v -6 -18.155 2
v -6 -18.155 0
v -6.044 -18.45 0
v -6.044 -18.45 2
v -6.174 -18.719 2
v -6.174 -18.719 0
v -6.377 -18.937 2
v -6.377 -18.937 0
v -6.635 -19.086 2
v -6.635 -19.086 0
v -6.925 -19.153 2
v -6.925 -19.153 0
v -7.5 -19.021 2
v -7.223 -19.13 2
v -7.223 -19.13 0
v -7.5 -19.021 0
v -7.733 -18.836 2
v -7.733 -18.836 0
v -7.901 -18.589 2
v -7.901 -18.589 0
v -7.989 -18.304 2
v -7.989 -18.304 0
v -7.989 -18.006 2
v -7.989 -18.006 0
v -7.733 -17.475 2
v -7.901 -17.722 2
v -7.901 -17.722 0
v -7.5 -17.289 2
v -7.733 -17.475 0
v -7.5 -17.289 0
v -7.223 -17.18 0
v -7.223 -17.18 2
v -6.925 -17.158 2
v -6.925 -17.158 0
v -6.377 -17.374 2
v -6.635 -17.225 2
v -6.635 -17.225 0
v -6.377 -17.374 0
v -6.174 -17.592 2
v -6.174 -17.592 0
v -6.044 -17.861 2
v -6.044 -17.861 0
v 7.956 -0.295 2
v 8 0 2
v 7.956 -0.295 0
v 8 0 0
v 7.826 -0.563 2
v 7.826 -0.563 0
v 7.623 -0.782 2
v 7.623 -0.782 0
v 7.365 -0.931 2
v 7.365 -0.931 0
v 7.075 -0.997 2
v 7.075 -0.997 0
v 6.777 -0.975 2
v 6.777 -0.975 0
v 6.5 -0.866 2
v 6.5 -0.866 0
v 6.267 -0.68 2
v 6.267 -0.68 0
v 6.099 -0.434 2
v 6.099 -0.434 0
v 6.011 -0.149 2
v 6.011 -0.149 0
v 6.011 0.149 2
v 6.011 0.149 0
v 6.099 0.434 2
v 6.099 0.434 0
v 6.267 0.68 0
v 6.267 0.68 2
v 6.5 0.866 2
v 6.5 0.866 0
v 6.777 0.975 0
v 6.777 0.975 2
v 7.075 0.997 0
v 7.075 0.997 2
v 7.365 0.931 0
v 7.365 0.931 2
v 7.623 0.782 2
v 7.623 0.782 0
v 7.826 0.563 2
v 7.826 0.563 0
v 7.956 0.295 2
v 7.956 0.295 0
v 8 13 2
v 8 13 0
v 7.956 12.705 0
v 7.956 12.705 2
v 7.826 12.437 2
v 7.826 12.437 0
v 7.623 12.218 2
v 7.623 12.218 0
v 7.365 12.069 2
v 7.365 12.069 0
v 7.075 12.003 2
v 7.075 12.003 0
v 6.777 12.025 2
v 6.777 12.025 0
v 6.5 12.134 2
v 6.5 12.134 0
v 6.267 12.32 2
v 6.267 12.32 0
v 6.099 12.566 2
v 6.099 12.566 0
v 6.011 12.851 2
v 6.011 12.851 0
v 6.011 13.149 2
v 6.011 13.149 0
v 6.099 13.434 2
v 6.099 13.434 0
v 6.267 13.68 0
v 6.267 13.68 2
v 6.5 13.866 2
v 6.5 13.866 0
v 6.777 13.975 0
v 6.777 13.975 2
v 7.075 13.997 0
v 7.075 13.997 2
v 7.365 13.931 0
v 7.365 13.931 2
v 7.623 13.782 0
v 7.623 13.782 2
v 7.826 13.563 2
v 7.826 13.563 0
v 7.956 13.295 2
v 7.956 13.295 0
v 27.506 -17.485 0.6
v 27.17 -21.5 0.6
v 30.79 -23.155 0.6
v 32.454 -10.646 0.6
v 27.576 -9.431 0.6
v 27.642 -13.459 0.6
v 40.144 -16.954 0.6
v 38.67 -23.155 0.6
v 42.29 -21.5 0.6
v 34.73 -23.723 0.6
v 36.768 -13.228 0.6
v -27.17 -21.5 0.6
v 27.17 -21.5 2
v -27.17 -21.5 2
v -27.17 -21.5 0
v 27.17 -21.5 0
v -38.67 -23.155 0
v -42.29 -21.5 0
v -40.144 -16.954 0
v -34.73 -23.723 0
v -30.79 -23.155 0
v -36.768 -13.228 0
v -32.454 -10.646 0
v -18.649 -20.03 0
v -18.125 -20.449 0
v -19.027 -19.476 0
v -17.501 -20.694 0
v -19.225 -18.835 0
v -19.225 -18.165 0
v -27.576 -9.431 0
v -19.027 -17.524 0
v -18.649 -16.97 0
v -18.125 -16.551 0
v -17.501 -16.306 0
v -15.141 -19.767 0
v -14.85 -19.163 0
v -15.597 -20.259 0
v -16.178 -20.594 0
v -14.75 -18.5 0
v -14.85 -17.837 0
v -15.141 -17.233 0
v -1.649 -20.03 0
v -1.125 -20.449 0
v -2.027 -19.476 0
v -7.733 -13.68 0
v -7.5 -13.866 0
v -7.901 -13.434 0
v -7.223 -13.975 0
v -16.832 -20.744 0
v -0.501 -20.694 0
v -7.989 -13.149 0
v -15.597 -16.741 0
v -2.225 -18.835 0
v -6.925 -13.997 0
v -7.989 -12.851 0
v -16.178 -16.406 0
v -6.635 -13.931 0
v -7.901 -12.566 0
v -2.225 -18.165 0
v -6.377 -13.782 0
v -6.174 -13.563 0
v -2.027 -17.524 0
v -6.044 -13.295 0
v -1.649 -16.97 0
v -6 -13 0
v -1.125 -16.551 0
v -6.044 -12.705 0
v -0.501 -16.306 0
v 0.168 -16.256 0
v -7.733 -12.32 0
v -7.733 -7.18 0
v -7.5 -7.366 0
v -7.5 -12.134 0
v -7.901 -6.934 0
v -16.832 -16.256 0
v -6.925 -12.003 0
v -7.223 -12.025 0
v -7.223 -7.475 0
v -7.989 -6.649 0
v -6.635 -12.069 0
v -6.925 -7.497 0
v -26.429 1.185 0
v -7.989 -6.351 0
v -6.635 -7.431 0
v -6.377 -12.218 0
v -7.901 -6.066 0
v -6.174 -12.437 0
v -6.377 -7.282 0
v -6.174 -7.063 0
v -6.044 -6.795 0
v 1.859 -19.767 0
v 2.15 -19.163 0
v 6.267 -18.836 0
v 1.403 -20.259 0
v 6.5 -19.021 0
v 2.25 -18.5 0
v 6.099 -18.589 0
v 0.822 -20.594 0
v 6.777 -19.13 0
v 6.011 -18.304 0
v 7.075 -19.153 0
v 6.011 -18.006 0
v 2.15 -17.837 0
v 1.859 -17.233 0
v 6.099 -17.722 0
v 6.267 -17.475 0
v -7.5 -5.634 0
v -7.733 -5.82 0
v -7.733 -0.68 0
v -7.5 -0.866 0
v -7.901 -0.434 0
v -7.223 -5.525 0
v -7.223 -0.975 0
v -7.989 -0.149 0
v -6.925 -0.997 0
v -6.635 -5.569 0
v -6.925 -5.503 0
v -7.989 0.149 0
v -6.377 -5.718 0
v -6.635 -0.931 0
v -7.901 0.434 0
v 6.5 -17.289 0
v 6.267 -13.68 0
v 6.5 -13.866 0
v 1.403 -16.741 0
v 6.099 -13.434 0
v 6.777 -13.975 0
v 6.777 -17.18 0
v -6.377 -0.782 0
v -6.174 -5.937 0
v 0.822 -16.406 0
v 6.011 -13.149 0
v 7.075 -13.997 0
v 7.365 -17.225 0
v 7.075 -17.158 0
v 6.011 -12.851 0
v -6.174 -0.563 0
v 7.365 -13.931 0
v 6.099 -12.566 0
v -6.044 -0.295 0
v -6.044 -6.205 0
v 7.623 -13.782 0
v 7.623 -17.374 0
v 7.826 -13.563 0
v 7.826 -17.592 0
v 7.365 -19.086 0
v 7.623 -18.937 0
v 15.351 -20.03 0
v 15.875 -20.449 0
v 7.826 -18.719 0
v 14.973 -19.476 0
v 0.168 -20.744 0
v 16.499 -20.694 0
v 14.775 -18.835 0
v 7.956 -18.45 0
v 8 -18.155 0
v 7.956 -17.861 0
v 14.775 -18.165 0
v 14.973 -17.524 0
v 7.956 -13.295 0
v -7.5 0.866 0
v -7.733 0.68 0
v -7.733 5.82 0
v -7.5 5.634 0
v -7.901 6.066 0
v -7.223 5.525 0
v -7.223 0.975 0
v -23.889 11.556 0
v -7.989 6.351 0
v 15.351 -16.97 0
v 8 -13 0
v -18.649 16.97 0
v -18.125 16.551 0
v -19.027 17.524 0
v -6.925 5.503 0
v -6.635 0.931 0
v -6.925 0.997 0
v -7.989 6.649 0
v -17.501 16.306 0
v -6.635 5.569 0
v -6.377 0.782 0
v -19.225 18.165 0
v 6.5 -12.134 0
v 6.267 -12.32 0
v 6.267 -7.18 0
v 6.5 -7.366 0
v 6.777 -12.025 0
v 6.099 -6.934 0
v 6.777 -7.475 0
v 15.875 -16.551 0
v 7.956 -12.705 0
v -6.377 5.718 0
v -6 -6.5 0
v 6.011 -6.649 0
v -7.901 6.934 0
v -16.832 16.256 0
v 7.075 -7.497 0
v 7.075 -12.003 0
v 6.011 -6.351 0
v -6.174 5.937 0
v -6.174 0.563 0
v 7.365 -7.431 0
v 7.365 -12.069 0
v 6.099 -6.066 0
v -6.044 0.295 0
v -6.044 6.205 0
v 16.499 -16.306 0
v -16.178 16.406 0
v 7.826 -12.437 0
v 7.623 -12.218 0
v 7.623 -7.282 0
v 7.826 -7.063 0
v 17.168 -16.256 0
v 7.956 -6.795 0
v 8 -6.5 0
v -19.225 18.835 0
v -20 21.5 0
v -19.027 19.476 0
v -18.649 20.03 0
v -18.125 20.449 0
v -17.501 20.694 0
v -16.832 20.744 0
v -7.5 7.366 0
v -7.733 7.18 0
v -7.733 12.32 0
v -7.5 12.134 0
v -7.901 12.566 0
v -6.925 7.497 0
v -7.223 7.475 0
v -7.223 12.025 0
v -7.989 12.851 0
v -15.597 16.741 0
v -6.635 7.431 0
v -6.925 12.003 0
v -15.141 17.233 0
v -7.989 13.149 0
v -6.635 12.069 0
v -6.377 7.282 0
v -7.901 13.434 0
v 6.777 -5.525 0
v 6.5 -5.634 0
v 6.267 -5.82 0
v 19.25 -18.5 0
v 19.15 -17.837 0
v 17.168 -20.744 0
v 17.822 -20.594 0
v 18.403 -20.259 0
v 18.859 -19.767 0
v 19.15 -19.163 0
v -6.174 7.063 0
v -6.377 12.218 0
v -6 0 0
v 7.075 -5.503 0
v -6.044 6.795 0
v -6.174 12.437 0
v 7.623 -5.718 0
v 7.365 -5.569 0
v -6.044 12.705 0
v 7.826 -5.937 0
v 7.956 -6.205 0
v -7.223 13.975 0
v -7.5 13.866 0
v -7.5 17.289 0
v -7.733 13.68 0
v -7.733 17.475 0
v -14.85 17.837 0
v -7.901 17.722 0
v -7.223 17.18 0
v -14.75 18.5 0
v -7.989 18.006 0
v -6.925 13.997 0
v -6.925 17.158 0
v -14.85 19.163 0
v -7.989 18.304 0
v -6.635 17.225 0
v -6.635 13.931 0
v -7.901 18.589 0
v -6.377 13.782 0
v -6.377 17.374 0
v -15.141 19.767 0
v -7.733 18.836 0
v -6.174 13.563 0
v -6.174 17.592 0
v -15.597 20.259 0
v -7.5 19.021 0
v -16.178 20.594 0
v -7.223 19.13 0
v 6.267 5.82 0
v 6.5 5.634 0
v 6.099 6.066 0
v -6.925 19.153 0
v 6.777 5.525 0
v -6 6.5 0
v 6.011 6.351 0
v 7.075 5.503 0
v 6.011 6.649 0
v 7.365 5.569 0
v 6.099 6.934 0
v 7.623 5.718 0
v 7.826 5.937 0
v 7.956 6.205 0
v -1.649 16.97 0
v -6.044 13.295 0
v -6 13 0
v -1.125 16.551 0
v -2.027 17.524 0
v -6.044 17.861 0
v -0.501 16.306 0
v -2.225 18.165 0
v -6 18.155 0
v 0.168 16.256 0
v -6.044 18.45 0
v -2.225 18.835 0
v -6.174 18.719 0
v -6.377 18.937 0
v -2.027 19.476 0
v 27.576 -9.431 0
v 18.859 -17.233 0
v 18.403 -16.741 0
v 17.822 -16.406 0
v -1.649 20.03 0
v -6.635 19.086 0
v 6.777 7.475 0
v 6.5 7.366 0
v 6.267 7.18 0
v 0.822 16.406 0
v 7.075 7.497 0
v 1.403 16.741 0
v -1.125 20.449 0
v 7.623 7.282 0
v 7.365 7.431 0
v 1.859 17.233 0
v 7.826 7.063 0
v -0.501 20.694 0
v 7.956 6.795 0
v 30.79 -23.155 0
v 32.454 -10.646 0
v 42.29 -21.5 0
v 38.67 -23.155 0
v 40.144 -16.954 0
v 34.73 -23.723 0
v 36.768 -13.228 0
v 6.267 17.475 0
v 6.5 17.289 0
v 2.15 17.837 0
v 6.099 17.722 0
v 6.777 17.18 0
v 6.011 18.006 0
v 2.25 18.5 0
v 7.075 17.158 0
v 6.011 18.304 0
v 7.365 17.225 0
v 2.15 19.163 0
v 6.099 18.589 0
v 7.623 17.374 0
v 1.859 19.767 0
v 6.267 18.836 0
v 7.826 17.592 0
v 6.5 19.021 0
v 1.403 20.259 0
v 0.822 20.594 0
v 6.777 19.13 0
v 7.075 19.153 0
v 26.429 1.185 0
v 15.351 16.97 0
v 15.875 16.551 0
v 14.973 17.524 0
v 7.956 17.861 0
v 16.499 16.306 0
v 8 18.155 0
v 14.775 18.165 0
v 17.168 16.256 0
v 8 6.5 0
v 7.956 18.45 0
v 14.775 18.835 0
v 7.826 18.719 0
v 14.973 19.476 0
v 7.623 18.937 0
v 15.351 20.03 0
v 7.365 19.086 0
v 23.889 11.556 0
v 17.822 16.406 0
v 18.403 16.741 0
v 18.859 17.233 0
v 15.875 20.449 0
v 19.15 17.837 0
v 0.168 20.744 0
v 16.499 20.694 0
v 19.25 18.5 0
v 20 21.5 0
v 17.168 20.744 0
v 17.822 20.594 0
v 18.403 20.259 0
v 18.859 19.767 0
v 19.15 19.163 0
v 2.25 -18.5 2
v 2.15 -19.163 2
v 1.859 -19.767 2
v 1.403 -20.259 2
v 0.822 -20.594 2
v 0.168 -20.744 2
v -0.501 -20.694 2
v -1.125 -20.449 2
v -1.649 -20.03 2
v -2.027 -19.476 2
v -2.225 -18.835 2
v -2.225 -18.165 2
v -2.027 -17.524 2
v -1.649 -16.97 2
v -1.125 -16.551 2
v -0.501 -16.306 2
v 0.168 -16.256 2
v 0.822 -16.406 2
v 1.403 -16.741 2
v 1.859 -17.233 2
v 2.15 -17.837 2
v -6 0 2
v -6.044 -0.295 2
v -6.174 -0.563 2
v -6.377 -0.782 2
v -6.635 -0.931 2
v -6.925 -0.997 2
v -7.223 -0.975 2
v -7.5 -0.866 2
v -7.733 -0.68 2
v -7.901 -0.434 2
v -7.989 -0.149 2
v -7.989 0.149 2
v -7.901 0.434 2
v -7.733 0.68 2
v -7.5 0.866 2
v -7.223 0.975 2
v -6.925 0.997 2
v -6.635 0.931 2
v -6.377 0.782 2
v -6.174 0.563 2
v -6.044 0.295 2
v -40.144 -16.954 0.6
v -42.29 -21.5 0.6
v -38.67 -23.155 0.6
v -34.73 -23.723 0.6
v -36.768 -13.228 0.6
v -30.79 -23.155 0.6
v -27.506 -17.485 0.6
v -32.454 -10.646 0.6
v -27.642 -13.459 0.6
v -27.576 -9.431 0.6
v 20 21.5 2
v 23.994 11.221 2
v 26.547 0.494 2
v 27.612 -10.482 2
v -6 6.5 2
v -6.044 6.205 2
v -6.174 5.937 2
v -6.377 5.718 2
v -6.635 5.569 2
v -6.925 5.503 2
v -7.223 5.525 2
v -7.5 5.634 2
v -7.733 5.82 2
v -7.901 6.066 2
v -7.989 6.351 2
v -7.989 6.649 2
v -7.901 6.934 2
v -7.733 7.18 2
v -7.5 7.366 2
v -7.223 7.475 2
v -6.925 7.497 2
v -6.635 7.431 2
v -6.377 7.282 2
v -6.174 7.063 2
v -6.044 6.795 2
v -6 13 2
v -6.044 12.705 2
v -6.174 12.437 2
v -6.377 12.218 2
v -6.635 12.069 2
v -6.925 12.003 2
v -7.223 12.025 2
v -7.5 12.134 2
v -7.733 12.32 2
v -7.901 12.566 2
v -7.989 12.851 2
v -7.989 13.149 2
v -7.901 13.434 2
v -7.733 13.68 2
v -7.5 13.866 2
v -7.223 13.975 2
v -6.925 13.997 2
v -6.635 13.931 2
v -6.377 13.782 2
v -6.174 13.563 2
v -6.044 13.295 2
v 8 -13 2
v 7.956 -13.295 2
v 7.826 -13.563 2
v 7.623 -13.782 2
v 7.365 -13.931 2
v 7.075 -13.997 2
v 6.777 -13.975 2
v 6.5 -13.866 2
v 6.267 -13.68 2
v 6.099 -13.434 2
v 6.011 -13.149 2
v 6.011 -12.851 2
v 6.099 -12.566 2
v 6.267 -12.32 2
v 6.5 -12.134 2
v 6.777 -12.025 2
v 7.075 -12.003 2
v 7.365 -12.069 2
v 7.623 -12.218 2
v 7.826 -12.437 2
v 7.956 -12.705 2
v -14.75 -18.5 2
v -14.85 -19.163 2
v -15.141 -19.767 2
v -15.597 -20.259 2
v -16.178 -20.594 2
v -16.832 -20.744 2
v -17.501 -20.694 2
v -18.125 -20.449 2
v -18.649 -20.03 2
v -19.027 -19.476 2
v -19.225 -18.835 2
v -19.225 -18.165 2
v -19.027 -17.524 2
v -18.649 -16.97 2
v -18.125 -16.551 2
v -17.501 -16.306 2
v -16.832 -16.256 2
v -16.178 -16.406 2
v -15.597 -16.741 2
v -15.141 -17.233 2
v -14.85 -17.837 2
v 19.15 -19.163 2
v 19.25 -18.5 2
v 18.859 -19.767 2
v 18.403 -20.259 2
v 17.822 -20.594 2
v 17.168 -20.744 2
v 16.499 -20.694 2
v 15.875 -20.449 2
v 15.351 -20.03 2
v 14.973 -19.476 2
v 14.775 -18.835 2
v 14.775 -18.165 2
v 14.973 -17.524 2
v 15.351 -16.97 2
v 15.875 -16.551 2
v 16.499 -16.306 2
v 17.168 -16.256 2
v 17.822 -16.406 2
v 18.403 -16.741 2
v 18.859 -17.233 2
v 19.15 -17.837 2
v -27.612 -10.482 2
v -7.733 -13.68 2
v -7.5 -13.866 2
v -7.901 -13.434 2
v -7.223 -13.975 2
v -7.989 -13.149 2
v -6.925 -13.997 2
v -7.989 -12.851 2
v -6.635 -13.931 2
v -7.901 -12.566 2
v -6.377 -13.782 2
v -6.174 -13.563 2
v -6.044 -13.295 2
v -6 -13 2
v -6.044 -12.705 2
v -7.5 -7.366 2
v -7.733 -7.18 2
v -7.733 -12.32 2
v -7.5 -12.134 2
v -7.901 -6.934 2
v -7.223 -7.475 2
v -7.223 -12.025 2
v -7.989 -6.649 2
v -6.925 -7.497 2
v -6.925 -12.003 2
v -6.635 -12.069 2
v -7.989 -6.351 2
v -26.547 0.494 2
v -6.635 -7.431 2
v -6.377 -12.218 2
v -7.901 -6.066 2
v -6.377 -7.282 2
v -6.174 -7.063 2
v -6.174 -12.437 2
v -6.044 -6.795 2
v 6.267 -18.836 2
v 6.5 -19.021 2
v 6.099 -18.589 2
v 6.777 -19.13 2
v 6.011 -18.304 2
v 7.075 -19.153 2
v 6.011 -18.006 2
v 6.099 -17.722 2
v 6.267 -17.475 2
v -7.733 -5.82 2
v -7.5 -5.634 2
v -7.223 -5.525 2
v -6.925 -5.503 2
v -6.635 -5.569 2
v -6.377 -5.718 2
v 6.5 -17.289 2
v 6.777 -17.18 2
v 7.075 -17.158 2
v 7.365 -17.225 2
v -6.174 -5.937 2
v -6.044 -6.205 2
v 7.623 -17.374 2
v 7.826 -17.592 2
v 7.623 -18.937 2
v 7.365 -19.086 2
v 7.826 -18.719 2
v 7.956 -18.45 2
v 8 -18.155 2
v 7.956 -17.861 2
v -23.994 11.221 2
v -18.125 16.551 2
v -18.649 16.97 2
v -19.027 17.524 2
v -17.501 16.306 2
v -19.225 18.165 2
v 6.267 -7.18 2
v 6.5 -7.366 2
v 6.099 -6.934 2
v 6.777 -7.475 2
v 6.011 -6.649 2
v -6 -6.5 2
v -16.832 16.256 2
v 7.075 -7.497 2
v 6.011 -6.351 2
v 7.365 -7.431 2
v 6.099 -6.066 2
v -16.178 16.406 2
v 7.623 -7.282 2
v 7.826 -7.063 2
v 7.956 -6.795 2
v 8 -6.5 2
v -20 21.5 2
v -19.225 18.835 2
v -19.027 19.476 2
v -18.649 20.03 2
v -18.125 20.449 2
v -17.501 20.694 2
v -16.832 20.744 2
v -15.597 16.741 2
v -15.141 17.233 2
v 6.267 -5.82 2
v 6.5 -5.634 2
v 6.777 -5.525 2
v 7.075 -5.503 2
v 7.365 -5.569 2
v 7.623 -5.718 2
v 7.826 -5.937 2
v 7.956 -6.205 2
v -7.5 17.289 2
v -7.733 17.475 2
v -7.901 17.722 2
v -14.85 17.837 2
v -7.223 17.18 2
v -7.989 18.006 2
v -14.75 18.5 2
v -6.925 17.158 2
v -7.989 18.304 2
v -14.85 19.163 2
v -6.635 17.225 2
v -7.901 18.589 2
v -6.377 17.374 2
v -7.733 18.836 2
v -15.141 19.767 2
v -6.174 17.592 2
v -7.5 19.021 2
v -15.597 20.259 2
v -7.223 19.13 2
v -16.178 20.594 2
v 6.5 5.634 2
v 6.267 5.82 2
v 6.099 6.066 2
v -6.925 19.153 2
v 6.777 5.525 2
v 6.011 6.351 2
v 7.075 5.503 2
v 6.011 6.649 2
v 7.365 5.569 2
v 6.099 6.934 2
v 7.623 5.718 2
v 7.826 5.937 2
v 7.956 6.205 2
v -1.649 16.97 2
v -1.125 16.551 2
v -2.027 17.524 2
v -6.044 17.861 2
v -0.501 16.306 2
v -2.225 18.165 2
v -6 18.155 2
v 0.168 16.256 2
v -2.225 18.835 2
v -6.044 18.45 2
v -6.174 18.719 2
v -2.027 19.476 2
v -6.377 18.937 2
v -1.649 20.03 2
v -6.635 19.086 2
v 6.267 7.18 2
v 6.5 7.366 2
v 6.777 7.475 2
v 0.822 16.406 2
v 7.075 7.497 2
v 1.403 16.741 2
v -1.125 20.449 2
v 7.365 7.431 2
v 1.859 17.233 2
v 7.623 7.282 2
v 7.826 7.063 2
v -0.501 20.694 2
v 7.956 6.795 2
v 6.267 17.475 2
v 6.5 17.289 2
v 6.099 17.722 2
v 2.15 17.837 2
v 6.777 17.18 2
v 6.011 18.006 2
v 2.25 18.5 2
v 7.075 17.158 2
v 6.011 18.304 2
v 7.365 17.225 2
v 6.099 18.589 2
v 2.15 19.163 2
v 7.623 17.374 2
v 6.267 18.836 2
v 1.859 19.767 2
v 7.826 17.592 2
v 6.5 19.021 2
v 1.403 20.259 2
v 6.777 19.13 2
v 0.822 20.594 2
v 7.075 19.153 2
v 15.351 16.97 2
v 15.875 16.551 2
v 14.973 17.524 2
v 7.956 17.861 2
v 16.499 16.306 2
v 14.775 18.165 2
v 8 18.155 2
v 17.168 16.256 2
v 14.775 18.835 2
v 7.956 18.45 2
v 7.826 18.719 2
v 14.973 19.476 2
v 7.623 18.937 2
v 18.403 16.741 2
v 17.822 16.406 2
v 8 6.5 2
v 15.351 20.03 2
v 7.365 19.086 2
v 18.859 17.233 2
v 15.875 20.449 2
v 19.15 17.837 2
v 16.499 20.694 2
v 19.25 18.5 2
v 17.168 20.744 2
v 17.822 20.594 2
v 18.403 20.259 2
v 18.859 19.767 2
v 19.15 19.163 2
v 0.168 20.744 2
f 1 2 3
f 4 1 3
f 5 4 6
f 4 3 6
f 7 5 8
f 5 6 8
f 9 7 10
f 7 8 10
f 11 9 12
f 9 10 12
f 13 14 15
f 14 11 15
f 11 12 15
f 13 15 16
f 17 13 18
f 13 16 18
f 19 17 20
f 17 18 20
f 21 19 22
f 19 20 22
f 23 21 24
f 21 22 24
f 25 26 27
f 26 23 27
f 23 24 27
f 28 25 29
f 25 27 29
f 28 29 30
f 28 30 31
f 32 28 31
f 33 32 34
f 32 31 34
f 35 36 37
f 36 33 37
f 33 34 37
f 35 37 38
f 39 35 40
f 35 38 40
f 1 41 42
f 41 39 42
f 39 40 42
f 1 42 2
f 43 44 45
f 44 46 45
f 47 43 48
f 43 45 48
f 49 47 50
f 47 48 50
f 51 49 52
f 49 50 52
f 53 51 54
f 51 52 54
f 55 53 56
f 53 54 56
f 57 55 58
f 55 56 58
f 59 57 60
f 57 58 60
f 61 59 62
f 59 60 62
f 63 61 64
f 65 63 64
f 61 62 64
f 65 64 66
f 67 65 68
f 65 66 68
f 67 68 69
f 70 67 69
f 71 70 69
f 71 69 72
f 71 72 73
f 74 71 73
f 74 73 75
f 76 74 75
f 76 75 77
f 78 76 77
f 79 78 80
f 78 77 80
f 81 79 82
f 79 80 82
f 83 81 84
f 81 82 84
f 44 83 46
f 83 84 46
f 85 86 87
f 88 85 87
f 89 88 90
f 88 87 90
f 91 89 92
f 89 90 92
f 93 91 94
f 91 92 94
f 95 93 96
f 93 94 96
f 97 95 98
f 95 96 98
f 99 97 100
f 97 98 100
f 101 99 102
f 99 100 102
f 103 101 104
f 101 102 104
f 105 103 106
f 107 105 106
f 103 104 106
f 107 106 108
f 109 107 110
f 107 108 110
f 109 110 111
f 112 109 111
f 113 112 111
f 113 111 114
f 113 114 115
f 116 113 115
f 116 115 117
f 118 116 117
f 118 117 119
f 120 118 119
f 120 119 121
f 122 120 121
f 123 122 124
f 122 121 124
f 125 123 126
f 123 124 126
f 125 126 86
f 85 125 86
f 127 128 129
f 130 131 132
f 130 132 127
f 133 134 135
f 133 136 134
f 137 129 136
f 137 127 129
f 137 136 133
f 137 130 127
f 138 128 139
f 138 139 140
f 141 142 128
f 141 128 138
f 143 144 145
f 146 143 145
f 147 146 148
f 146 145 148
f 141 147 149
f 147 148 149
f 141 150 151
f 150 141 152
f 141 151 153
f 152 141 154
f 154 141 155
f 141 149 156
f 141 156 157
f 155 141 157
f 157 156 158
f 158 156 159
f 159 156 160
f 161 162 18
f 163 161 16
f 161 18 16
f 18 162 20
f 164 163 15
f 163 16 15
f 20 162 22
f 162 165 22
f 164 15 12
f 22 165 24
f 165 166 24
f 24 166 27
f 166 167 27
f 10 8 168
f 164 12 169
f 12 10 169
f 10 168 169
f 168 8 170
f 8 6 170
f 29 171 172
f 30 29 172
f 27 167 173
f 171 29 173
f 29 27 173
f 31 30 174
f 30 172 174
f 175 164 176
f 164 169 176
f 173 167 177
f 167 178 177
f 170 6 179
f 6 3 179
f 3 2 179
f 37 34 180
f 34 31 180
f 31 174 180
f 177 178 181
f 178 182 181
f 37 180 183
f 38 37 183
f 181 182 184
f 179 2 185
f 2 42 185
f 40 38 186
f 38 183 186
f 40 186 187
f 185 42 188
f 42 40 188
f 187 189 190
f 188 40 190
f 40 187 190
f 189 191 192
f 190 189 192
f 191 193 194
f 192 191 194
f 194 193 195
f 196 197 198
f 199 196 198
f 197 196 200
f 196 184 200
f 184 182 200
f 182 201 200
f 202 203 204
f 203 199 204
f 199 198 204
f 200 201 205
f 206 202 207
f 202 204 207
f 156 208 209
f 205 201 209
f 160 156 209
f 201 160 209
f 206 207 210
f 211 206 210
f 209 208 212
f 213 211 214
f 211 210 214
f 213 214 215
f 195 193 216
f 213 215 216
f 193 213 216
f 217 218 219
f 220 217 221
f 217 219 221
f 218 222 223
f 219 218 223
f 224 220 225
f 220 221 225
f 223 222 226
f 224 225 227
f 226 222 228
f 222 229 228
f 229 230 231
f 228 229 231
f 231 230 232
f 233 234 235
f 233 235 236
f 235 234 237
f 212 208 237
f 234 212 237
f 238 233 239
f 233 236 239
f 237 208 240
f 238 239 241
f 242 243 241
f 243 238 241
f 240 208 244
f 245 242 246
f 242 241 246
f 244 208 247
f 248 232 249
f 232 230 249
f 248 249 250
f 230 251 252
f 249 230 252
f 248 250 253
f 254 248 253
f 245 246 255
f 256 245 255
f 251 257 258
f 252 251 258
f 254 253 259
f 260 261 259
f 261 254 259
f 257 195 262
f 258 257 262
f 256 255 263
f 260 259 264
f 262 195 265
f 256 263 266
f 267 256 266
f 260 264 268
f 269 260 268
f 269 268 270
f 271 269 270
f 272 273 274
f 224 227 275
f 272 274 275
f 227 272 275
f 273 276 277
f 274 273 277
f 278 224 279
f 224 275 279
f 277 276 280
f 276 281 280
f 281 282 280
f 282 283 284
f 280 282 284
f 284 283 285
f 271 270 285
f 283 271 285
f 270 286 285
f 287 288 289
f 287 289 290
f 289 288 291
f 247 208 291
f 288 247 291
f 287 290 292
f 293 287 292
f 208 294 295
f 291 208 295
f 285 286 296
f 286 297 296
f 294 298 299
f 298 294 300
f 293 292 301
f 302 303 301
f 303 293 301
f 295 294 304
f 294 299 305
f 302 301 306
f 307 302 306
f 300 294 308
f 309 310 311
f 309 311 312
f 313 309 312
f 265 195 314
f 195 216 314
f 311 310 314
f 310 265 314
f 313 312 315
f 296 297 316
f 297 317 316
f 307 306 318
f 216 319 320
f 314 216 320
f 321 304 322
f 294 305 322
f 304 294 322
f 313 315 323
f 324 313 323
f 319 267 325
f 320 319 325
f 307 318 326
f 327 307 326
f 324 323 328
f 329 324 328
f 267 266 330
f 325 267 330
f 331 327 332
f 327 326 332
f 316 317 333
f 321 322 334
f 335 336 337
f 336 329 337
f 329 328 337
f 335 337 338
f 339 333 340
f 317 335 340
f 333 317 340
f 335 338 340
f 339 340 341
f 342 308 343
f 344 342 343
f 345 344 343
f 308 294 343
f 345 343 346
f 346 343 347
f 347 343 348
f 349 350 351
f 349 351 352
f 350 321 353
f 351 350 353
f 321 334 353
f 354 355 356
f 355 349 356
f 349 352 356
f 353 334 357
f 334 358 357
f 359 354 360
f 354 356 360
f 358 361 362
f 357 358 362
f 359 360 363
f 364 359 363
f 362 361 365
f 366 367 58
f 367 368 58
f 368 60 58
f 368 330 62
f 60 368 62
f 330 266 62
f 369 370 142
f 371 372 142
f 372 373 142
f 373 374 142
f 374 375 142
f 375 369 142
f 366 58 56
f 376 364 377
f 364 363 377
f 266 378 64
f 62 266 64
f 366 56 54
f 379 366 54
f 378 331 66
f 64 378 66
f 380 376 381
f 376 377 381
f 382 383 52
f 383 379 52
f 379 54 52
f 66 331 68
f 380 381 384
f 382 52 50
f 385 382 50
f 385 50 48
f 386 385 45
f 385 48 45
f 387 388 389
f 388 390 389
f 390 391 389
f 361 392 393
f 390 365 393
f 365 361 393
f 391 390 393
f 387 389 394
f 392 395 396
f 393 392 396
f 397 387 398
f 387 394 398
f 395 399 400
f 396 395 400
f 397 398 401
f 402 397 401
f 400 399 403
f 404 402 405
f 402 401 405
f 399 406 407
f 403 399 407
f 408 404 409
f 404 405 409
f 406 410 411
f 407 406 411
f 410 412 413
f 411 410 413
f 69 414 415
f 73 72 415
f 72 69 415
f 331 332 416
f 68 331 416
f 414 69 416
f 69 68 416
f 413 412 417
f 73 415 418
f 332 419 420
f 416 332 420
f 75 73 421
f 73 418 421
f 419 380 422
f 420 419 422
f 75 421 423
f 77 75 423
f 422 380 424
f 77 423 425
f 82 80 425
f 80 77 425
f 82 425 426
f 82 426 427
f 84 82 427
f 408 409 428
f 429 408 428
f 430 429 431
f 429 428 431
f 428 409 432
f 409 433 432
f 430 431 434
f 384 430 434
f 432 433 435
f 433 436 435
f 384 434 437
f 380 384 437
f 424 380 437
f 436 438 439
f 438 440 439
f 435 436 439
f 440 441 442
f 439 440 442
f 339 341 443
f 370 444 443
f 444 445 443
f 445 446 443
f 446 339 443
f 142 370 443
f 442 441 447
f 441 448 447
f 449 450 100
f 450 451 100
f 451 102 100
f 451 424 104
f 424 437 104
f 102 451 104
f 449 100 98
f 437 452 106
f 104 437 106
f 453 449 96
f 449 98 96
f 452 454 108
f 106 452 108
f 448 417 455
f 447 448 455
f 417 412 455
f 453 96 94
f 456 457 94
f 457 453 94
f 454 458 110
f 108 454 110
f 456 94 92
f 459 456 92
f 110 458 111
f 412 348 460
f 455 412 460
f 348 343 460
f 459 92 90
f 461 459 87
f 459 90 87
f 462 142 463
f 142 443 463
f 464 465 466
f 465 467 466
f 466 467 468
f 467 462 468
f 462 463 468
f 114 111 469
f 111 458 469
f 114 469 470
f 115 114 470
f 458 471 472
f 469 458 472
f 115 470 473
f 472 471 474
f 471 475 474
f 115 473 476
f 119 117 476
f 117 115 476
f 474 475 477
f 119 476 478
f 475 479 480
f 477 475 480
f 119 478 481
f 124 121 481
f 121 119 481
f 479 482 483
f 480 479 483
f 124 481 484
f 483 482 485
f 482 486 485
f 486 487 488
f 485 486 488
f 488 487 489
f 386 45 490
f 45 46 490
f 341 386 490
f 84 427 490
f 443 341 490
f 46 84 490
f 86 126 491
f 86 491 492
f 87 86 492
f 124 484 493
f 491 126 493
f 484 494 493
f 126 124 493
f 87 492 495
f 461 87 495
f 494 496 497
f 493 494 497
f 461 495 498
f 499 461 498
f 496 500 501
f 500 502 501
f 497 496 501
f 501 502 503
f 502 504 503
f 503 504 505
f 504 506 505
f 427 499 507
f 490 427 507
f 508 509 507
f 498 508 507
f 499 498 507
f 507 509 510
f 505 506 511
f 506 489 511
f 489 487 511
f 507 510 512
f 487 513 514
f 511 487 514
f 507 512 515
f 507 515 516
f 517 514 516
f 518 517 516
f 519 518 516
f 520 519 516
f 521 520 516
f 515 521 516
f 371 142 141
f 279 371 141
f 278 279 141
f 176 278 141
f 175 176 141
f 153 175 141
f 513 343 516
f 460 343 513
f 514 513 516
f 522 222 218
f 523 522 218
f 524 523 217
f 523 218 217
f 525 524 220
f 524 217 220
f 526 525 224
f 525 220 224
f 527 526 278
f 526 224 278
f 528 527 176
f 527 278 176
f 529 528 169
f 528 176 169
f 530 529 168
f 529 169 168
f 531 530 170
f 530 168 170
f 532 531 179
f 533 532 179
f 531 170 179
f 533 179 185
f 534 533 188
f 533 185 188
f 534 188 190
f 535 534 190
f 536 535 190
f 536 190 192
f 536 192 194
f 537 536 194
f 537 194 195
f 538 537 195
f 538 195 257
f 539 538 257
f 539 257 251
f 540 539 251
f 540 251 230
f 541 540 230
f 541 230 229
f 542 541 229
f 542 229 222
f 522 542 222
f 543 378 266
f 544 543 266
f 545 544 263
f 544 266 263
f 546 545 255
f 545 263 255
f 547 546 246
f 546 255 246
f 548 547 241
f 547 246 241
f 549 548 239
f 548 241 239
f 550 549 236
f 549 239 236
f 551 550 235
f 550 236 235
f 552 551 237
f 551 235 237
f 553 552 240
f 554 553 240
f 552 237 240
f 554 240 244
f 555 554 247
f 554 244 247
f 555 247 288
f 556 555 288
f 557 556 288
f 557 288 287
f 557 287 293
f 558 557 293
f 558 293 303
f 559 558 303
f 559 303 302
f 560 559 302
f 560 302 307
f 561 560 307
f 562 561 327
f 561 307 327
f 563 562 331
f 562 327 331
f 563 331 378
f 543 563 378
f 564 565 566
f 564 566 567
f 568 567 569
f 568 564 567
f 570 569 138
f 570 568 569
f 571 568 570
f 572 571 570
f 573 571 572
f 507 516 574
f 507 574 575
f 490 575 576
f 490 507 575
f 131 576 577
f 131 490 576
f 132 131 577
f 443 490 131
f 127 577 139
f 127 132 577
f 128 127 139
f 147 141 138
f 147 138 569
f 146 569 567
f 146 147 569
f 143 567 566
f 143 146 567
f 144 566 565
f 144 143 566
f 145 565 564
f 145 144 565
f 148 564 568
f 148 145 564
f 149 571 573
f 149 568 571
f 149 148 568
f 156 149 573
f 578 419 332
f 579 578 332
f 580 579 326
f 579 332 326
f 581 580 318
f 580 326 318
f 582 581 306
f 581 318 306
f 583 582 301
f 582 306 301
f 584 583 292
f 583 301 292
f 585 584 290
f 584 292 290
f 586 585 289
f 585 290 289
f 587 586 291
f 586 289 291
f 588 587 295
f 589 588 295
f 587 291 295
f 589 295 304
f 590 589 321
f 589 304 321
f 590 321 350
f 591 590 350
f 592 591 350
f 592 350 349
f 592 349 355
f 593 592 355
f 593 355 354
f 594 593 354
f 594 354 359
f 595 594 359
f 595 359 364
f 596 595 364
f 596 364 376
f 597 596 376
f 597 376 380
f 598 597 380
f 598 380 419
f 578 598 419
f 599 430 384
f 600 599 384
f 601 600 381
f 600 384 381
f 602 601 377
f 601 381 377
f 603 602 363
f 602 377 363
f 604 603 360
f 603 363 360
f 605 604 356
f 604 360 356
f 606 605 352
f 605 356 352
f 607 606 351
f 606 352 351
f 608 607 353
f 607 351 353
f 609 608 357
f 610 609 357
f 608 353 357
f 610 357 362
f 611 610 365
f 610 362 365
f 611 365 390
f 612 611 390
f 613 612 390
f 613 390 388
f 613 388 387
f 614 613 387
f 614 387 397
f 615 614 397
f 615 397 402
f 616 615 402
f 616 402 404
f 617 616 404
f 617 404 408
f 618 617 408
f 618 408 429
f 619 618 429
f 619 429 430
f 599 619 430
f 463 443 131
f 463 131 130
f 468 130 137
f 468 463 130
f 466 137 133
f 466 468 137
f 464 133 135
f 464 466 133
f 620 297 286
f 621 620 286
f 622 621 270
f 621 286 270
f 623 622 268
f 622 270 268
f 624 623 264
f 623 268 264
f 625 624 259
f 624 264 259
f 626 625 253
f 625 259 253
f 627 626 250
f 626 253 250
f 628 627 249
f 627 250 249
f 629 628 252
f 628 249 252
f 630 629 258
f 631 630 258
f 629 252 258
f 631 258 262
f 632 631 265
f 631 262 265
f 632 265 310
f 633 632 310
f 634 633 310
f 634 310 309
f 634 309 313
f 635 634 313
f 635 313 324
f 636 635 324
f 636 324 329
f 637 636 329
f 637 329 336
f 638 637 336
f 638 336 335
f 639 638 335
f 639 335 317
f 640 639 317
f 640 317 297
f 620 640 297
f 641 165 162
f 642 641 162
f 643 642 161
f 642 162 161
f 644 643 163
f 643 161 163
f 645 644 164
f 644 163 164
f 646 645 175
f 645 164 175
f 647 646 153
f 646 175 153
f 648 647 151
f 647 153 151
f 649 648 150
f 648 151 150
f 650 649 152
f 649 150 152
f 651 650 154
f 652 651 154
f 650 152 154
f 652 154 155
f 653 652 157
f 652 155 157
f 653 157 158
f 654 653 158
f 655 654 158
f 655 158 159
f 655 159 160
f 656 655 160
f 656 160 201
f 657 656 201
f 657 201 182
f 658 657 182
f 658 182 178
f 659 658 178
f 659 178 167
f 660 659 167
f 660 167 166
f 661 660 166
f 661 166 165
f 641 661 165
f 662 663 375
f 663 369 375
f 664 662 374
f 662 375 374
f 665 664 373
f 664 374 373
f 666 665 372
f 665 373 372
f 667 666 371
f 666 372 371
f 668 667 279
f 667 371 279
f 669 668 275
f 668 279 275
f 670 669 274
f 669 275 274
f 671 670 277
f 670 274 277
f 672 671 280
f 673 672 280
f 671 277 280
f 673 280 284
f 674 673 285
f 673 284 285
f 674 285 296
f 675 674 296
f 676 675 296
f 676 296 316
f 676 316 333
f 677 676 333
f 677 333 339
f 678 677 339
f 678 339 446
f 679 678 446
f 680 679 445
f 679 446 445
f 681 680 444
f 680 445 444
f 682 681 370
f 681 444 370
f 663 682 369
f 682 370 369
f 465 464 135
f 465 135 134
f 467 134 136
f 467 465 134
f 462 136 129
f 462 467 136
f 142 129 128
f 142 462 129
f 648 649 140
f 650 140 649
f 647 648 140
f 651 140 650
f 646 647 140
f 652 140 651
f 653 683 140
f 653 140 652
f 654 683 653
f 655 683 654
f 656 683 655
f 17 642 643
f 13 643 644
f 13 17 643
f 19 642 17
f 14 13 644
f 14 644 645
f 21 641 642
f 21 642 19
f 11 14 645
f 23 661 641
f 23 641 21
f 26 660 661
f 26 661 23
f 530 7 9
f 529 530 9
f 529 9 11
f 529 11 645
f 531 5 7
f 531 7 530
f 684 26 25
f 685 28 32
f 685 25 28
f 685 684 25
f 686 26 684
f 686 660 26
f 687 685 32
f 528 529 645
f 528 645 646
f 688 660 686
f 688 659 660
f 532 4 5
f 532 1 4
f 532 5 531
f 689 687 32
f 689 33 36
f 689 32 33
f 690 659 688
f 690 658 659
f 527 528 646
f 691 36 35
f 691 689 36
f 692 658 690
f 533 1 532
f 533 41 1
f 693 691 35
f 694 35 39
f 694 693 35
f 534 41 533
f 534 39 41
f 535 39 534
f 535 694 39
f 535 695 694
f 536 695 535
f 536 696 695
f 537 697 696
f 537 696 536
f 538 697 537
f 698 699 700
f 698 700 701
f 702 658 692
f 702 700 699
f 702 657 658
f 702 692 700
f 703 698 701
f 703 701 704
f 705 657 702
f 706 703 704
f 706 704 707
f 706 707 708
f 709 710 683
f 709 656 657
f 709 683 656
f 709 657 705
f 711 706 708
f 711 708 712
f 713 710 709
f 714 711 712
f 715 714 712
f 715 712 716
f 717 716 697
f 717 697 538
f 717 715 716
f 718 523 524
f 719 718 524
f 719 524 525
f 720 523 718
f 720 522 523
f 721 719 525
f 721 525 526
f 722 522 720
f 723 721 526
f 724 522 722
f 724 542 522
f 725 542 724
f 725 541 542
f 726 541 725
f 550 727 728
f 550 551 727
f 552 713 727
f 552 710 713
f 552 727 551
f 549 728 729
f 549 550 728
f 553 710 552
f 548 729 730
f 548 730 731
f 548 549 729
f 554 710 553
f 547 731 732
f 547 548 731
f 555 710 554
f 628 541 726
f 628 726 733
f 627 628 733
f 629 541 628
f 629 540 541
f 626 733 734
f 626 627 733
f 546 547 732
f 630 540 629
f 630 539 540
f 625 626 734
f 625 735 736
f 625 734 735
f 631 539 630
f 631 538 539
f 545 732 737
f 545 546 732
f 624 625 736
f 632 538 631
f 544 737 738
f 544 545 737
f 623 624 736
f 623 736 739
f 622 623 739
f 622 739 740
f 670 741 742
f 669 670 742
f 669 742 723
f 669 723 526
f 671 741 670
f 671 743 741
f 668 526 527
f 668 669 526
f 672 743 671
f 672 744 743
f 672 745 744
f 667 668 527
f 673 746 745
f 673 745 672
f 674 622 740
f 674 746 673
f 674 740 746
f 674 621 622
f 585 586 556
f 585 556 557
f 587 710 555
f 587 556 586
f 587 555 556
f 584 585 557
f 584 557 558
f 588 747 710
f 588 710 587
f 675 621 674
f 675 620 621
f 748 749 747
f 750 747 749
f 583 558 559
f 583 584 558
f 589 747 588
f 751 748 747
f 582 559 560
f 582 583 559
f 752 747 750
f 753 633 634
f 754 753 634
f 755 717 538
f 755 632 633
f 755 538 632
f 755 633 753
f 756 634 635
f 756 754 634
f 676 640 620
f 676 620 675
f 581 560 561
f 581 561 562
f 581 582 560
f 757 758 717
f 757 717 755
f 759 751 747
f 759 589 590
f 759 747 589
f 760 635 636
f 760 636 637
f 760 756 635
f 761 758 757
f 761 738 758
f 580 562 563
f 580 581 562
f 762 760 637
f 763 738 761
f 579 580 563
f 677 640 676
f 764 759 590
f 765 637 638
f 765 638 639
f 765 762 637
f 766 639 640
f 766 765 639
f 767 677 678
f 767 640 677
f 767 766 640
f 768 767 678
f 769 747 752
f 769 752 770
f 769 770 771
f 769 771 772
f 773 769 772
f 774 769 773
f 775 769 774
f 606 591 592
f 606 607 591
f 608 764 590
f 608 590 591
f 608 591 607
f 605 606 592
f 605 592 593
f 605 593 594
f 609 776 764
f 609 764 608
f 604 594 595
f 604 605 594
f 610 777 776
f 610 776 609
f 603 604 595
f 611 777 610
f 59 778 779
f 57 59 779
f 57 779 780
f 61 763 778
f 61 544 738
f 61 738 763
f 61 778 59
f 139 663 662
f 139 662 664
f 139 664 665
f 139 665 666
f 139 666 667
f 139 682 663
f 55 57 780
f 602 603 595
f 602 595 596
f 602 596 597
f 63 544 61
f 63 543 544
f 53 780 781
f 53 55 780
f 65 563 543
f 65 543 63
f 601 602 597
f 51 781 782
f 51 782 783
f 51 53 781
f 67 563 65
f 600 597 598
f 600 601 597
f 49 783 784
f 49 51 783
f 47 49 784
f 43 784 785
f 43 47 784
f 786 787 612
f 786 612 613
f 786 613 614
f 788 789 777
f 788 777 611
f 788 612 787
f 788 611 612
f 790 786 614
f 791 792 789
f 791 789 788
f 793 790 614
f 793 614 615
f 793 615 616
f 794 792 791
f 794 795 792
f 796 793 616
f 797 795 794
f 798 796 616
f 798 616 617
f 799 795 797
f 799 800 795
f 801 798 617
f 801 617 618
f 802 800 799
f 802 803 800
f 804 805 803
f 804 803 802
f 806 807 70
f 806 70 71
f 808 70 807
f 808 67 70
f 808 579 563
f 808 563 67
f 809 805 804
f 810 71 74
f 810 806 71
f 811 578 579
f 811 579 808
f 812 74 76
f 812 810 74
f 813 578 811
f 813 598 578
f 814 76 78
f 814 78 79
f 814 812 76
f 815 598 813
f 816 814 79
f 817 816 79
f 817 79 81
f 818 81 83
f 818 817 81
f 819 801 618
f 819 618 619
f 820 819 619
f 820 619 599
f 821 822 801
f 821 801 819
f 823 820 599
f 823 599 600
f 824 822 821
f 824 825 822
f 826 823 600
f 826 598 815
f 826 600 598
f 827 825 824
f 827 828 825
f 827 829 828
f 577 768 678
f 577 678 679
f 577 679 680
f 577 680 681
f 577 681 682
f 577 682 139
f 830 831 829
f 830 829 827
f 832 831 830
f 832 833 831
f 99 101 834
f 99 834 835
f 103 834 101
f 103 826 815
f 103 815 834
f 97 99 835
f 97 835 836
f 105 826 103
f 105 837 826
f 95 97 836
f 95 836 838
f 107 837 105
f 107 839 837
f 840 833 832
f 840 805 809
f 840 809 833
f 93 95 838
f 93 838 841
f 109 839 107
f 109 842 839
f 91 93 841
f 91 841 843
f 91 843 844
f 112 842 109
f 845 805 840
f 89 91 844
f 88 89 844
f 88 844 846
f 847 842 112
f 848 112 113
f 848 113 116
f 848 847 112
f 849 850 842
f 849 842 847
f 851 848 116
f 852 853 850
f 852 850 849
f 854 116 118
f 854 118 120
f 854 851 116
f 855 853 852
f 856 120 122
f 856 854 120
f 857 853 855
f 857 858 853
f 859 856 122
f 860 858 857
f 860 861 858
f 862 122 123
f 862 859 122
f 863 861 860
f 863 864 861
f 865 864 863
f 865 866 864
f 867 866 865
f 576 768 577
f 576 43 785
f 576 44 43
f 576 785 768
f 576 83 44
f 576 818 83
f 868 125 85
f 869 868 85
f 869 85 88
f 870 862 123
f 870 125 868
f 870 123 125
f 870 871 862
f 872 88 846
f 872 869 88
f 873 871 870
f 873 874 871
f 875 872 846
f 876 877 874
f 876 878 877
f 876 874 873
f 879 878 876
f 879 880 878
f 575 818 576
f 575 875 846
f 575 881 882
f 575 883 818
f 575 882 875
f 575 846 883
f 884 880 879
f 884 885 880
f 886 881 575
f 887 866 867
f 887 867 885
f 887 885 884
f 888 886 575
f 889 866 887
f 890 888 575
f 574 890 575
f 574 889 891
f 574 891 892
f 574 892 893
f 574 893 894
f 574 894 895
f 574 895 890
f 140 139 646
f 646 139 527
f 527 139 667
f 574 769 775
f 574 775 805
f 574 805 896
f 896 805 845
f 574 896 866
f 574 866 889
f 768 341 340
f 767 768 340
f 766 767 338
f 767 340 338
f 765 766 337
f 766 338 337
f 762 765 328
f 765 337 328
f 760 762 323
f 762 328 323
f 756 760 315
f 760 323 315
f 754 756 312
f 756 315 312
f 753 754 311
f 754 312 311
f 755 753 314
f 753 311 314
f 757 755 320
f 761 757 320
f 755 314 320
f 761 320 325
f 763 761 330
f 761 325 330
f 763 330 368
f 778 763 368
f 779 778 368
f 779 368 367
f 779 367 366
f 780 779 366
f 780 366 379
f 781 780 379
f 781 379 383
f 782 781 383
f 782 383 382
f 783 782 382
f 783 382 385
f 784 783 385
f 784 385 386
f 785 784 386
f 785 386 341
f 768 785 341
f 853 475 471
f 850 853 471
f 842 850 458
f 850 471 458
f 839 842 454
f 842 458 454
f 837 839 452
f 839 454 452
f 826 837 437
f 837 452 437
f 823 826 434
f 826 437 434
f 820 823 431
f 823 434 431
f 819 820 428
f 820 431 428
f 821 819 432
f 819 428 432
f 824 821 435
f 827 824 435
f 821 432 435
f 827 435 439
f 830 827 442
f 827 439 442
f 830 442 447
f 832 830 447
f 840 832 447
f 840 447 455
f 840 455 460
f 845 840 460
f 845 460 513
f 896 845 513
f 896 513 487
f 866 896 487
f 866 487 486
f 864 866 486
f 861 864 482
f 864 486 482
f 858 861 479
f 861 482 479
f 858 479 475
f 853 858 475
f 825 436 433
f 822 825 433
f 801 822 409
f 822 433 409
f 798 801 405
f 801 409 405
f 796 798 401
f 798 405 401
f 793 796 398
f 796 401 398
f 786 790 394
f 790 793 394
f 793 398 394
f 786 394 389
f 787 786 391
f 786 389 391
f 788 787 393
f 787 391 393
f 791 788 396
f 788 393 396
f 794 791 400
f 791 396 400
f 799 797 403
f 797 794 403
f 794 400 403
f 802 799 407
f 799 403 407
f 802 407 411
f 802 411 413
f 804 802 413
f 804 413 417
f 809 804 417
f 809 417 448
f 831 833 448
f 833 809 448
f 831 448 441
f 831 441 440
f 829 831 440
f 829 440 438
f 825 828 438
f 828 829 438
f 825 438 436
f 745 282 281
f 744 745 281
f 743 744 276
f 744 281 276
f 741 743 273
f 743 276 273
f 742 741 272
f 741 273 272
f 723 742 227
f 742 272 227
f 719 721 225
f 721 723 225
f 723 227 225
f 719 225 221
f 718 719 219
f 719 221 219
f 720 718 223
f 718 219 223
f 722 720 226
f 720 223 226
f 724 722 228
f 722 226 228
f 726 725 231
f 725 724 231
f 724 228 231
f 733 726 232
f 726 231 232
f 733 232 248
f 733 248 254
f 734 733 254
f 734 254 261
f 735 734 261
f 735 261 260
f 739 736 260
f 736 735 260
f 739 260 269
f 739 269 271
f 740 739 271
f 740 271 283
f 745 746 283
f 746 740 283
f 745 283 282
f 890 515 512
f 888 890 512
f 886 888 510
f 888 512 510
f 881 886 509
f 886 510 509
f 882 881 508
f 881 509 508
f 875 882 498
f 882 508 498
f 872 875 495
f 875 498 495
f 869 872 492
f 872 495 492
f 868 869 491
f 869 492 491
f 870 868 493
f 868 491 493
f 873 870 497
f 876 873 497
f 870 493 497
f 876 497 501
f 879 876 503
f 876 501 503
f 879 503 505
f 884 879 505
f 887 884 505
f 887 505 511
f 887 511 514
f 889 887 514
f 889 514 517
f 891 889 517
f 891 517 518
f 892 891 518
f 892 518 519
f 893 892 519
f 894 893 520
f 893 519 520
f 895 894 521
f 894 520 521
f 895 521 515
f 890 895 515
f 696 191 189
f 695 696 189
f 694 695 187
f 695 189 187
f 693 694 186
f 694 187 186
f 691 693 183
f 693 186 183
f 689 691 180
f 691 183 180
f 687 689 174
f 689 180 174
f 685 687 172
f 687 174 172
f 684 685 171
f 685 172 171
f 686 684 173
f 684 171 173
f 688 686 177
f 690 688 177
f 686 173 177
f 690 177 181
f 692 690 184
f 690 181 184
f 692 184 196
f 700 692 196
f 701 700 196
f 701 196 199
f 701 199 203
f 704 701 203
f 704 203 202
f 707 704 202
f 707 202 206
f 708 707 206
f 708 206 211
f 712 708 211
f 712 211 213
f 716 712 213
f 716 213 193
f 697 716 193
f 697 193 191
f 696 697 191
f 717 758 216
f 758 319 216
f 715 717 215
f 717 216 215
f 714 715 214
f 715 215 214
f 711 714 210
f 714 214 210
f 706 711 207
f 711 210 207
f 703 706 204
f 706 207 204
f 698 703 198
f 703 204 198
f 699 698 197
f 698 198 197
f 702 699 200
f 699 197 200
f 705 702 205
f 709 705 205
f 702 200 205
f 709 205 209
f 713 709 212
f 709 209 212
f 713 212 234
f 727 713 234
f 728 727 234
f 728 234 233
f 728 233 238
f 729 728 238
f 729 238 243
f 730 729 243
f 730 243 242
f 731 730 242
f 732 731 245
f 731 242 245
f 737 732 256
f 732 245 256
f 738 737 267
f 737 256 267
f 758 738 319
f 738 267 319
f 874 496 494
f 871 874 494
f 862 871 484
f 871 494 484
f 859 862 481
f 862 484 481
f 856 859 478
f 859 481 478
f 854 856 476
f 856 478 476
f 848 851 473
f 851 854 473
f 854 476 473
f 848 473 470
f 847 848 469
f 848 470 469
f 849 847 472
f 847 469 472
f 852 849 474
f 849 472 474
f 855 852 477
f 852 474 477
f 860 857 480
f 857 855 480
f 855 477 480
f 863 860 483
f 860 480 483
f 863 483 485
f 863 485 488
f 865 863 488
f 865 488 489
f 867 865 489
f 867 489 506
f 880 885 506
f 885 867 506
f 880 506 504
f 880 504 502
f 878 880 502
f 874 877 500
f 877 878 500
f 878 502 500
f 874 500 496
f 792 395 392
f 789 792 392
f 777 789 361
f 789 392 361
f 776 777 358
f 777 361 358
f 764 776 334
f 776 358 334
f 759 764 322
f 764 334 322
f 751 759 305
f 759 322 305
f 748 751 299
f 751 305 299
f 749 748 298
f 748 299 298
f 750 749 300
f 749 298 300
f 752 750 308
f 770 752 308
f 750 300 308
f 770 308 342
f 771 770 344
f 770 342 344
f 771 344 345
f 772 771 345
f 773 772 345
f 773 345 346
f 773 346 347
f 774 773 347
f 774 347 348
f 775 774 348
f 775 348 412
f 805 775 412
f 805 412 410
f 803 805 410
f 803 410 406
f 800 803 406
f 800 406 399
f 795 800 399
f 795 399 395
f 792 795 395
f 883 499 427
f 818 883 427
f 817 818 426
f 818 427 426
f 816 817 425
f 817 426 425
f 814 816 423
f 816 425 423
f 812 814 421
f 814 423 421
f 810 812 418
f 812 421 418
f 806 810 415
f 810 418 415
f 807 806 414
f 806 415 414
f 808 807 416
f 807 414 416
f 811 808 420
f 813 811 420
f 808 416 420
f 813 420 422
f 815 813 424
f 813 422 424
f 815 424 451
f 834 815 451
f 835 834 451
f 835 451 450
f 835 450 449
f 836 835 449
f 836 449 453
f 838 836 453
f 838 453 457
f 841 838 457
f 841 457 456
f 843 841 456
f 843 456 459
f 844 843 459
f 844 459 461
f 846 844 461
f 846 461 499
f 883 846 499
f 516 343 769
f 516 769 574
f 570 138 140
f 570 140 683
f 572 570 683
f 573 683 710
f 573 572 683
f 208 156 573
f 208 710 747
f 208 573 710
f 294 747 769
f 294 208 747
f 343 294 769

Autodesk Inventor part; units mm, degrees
ref_plane "YZ Plane" through (0, 0, 0) normal (1, 0, 0) x (0, 1, 0)
ref_plane "XZ Plane" through (0, 0, 0) normal (0, 1, 0) x (-1, 0, 0)
ref_plane "XY Plane" through (0, 0, 0) normal (0, 0, 1) x (1, 0, 0)
sketch "Block1" plane through (0, 0, 0) normal (0, 0, 1) x (1, 0, 0)
  line L0 (22.5674, 54.9733) -> (22.5674, 26.9733) construction
  line L1 (62.5674, 54.9733) -> (62.5674, 26.9733) construction
  line L2 (42.5674, 54.9733) -> (42.5674, 26.9733) construction
  arc A0 (22.5674, 54.9733) -> (16.0189, 31.9733) centre (39.6923, 37.6653) ccw
  arc A1 (69.116, 31.9733) -> (62.5674, 54.9733) centre (45.4425, 37.6653) ccw
  line L3 (67.5674, 31.9733) -> (69.116, 31.9733)
  line L4 (22.5674, 54.9733) -> (62.5674, 54.9733)
  arc A2 (3.175, 28.049) -> (16.0189, 31.9733) centre (7.7246, 36.1392) ccw
  arc A3 (15.3685, 38.7512) -> (3.175, 28.049) centre (13.5542, 28.5209) ccw
  arc A4 (69.116, 31.9733) -> (81.9598, 28.049) centre (77.4102, 36.1392) ccw
  arc A5 (81.9598, 28.049) -> (69.7664, 38.7512) centre (71.5807, 28.5209) ccw
  line L5 (17.5674, 54.9733) -> (67.5674, 54.9733) construction
  line L6 (67.5674, 54.9733) -> (67.5674, 31.9733) construction
  line L7 (67.5674, 31.9733) -> (16.0189, 31.9733)
  line L8 (17.5674, 31.9733) -> (17.5674, 54.9733) construction
  line L9 (22.5674, 31.9733) -> (62.5674, 31.9733)
  line L10 (62.5674, 31.9733) -> (62.5674, 26.9733)
  line L11 (62.5674, 26.9733) -> (22.5674, 26.9733)
  line L12 (22.5674, 26.9733) -> (22.5674, 31.9733)
  circle A6 centre (35.5674, 51.6287) radius 1
  circle A7 centre (49.5674, 51.6287) radius 1
  line L13 (22.5674, 29.4733) -> (62.5674, 29.4733) construction
  circle A8 centre (35.5674, 29.4733) radius 1
  circle A9 centre (49.5674, 29.4733) radius 1
  point P0 (42.5377, 37.3132)
  point P1 (42.5674, 31.9733)
  point P2 (42.5674, 31.9733)
  point P3 (17.5674, 26.9733)
  point P4 (67.5674, 26.9733)
  dimension "d0" = 23
  dimension "d1" = 5
  dimension "d2" = 40
  dimension "d3" = 2
  dimension "d4" = 2
  dimension "d5" = 7
  dimension "d6" = 7
  dimension "d7" = 2
  dimension "d8" = 2
  dimension "d9" = 7
  dimension "d10" = 7
sketch "Sketch1" plane through (0, 0, 0) normal (0, 0, 1) x (1, 0, 0)
  line L0 (-20, 21.5) -> (-20, -26.5) construction
  line L1 (20, 21.5) -> (20, -26.5) construction
  line L2 (0, 21.5) -> (0, -26.5) construction
  line L3 (27.1698, -21.5) -> (25.1885, -21.5)
  line L4 (-20, 21.5) -> (20, 21.5)
  line L5 (-27.1698, 21.5) -> (27.1698, 21.5) construction
  line L6 (27.1698, 21.5) -> (27.1698, -21.5) construction
  line L7 (27.1698, -21.5) -> (-27.1698, -21.5)
  line L8 (-27.1698, -21.5) -> (-27.1698, 21.5) construction
  line L9 (-20, -21.5) -> (20, -21.5)
  line L10 (20, -21.5) -> (20, -26.5)
  line L11 (20, -26.5) -> (-20, -26.5)
  line L12 (-20, -26.5) -> (-20, -21.5)
  circle A0 centre (-7, 18.1554) radius 1
  circle A1 centre (7, 18.1554) radius 1
  line L13 (-20, -24) -> (20, -24) construction
  circle A2 centre (-7, -24) radius 1
  circle A3 centre (7, -24) radius 1
  circle A4 centre (-17, -18.5) radius 2.25
  circle A5 centre (17, -18.5) radius 2.25
  circle A6 centre (0, -18.5) radius 2.25
  line L14 (-27.1698, 0) -> (27.1698, 0) construction
  circle A7 centre (-7, 0) radius 1
  circle A8 centre (7, 0) radius 1
  circle A9 centre (-7, -18.1554) radius 1
  circle A10 centre (7, -18.1554) radius 1
  arc A11 (-20, 21.5) -> (-27.1698, -21.5) centre (52.9621, -12.7633) ccw
  arc A12 (27.1698, -21.5) -> (20, 21.5) centre (-52.9621, -12.7633) ccw
  arc A13 (-42.2904, -21.5) -> (-27.1698, -21.5) centre (-34.7301, -9.753) ccw
  arc A14 (-27.5757, -9.4306) -> (-42.2904, -21.5) centre (-25.9265, -26.4458) ccw
  arc A15 (27.1698, -21.5) -> (42.2904, -21.5) centre (34.7301, -9.753) ccw
  arc A16 (42.2904, -21.5) -> (27.5757, -9.4306) centre (25.9265, -26.4458) ccw
  point P0 (0, 0)
  point P1 (0, -21.5)
  point P2 (0, -21.5)
  point P3 (-27.9814, 24.963)
  point P4 (27.9814, 24.963)
  point P5 (0, -2.5)
  point P6 (0, 0)
  dimension "d12" = 43
  dimension "d13" = 5
  dimension "d14" = 40
  dimension "d15" = 2
  dimension "d16" = 2
  dimension "d17" = 7
  dimension "d18" = 7
  dimension "d19" = 2
  dimension "d20" = 2
  dimension "d21" = 7
  dimension "d22" = 7
  dimension "d24" = 4.5
  dimension "d25" = 4.5
  dimension "d26" = 3
  dimension "d27" = 3
  dimension "d28" = 3
  dimension "d29" = 3
  dimension "d34" = 4.5
  dimension "d35" = 3
  dimension "d38" = 3.3446
  dimension "d39" = 3.3446
  dimension "d40" = 2
  dimension "d41" = 2
  dimension "d42" = 7
  dimension "d43" = 7
extrude "Extrusion1" add sketch "Sketch1" along normal blind 2 contours L3 L7 A11 L4 A12 | A4 | A5 | A6 | A7 | A8
extrude "Extrusion2" add sketch "Sketch1" along normal blind 0.6 contours A13 A14 A11
mirror "Mirror1" about plane through (0, 0, 0) normal (1, 0, 0) of "Extrusion2"
extrude "Extrusion3" cut sketch "Sketch1" along normal blind 5 contours A4 | A5 | A6
mirror "Mirror2" about plane through (0, 0, 0) normal (0, 1, 0) of "Extrusion3"
extrude "Extrusion4" cut sketch "Sketch1" along normal blind 10 contours A7 | A8
pattern_linear "Rectangular Pattern1" count 3 spacing 6.5 along (0, 1, 0) count 3 spacing 6.5 along (0, -1, 0) of "Extrusion4"
equation "\"d3\" = d11"
equation "\"d4\" = d11"
equation "\"d7\" = d11"
equation "\"d8\" = d11"
equation "\"d15\" = fishing"
equation "\"d16\" = fishing"
equation "\"d19\" = fishing"
equation "\"d20\" = fishing"
equation "\"d40\" = fishing"
equation "\"d41\" = fishing"
equation "\"d11\" = 2"
equation "\"d23\" = 2"
equation "\"fishing\" = 2"
properties part number "Piece"
